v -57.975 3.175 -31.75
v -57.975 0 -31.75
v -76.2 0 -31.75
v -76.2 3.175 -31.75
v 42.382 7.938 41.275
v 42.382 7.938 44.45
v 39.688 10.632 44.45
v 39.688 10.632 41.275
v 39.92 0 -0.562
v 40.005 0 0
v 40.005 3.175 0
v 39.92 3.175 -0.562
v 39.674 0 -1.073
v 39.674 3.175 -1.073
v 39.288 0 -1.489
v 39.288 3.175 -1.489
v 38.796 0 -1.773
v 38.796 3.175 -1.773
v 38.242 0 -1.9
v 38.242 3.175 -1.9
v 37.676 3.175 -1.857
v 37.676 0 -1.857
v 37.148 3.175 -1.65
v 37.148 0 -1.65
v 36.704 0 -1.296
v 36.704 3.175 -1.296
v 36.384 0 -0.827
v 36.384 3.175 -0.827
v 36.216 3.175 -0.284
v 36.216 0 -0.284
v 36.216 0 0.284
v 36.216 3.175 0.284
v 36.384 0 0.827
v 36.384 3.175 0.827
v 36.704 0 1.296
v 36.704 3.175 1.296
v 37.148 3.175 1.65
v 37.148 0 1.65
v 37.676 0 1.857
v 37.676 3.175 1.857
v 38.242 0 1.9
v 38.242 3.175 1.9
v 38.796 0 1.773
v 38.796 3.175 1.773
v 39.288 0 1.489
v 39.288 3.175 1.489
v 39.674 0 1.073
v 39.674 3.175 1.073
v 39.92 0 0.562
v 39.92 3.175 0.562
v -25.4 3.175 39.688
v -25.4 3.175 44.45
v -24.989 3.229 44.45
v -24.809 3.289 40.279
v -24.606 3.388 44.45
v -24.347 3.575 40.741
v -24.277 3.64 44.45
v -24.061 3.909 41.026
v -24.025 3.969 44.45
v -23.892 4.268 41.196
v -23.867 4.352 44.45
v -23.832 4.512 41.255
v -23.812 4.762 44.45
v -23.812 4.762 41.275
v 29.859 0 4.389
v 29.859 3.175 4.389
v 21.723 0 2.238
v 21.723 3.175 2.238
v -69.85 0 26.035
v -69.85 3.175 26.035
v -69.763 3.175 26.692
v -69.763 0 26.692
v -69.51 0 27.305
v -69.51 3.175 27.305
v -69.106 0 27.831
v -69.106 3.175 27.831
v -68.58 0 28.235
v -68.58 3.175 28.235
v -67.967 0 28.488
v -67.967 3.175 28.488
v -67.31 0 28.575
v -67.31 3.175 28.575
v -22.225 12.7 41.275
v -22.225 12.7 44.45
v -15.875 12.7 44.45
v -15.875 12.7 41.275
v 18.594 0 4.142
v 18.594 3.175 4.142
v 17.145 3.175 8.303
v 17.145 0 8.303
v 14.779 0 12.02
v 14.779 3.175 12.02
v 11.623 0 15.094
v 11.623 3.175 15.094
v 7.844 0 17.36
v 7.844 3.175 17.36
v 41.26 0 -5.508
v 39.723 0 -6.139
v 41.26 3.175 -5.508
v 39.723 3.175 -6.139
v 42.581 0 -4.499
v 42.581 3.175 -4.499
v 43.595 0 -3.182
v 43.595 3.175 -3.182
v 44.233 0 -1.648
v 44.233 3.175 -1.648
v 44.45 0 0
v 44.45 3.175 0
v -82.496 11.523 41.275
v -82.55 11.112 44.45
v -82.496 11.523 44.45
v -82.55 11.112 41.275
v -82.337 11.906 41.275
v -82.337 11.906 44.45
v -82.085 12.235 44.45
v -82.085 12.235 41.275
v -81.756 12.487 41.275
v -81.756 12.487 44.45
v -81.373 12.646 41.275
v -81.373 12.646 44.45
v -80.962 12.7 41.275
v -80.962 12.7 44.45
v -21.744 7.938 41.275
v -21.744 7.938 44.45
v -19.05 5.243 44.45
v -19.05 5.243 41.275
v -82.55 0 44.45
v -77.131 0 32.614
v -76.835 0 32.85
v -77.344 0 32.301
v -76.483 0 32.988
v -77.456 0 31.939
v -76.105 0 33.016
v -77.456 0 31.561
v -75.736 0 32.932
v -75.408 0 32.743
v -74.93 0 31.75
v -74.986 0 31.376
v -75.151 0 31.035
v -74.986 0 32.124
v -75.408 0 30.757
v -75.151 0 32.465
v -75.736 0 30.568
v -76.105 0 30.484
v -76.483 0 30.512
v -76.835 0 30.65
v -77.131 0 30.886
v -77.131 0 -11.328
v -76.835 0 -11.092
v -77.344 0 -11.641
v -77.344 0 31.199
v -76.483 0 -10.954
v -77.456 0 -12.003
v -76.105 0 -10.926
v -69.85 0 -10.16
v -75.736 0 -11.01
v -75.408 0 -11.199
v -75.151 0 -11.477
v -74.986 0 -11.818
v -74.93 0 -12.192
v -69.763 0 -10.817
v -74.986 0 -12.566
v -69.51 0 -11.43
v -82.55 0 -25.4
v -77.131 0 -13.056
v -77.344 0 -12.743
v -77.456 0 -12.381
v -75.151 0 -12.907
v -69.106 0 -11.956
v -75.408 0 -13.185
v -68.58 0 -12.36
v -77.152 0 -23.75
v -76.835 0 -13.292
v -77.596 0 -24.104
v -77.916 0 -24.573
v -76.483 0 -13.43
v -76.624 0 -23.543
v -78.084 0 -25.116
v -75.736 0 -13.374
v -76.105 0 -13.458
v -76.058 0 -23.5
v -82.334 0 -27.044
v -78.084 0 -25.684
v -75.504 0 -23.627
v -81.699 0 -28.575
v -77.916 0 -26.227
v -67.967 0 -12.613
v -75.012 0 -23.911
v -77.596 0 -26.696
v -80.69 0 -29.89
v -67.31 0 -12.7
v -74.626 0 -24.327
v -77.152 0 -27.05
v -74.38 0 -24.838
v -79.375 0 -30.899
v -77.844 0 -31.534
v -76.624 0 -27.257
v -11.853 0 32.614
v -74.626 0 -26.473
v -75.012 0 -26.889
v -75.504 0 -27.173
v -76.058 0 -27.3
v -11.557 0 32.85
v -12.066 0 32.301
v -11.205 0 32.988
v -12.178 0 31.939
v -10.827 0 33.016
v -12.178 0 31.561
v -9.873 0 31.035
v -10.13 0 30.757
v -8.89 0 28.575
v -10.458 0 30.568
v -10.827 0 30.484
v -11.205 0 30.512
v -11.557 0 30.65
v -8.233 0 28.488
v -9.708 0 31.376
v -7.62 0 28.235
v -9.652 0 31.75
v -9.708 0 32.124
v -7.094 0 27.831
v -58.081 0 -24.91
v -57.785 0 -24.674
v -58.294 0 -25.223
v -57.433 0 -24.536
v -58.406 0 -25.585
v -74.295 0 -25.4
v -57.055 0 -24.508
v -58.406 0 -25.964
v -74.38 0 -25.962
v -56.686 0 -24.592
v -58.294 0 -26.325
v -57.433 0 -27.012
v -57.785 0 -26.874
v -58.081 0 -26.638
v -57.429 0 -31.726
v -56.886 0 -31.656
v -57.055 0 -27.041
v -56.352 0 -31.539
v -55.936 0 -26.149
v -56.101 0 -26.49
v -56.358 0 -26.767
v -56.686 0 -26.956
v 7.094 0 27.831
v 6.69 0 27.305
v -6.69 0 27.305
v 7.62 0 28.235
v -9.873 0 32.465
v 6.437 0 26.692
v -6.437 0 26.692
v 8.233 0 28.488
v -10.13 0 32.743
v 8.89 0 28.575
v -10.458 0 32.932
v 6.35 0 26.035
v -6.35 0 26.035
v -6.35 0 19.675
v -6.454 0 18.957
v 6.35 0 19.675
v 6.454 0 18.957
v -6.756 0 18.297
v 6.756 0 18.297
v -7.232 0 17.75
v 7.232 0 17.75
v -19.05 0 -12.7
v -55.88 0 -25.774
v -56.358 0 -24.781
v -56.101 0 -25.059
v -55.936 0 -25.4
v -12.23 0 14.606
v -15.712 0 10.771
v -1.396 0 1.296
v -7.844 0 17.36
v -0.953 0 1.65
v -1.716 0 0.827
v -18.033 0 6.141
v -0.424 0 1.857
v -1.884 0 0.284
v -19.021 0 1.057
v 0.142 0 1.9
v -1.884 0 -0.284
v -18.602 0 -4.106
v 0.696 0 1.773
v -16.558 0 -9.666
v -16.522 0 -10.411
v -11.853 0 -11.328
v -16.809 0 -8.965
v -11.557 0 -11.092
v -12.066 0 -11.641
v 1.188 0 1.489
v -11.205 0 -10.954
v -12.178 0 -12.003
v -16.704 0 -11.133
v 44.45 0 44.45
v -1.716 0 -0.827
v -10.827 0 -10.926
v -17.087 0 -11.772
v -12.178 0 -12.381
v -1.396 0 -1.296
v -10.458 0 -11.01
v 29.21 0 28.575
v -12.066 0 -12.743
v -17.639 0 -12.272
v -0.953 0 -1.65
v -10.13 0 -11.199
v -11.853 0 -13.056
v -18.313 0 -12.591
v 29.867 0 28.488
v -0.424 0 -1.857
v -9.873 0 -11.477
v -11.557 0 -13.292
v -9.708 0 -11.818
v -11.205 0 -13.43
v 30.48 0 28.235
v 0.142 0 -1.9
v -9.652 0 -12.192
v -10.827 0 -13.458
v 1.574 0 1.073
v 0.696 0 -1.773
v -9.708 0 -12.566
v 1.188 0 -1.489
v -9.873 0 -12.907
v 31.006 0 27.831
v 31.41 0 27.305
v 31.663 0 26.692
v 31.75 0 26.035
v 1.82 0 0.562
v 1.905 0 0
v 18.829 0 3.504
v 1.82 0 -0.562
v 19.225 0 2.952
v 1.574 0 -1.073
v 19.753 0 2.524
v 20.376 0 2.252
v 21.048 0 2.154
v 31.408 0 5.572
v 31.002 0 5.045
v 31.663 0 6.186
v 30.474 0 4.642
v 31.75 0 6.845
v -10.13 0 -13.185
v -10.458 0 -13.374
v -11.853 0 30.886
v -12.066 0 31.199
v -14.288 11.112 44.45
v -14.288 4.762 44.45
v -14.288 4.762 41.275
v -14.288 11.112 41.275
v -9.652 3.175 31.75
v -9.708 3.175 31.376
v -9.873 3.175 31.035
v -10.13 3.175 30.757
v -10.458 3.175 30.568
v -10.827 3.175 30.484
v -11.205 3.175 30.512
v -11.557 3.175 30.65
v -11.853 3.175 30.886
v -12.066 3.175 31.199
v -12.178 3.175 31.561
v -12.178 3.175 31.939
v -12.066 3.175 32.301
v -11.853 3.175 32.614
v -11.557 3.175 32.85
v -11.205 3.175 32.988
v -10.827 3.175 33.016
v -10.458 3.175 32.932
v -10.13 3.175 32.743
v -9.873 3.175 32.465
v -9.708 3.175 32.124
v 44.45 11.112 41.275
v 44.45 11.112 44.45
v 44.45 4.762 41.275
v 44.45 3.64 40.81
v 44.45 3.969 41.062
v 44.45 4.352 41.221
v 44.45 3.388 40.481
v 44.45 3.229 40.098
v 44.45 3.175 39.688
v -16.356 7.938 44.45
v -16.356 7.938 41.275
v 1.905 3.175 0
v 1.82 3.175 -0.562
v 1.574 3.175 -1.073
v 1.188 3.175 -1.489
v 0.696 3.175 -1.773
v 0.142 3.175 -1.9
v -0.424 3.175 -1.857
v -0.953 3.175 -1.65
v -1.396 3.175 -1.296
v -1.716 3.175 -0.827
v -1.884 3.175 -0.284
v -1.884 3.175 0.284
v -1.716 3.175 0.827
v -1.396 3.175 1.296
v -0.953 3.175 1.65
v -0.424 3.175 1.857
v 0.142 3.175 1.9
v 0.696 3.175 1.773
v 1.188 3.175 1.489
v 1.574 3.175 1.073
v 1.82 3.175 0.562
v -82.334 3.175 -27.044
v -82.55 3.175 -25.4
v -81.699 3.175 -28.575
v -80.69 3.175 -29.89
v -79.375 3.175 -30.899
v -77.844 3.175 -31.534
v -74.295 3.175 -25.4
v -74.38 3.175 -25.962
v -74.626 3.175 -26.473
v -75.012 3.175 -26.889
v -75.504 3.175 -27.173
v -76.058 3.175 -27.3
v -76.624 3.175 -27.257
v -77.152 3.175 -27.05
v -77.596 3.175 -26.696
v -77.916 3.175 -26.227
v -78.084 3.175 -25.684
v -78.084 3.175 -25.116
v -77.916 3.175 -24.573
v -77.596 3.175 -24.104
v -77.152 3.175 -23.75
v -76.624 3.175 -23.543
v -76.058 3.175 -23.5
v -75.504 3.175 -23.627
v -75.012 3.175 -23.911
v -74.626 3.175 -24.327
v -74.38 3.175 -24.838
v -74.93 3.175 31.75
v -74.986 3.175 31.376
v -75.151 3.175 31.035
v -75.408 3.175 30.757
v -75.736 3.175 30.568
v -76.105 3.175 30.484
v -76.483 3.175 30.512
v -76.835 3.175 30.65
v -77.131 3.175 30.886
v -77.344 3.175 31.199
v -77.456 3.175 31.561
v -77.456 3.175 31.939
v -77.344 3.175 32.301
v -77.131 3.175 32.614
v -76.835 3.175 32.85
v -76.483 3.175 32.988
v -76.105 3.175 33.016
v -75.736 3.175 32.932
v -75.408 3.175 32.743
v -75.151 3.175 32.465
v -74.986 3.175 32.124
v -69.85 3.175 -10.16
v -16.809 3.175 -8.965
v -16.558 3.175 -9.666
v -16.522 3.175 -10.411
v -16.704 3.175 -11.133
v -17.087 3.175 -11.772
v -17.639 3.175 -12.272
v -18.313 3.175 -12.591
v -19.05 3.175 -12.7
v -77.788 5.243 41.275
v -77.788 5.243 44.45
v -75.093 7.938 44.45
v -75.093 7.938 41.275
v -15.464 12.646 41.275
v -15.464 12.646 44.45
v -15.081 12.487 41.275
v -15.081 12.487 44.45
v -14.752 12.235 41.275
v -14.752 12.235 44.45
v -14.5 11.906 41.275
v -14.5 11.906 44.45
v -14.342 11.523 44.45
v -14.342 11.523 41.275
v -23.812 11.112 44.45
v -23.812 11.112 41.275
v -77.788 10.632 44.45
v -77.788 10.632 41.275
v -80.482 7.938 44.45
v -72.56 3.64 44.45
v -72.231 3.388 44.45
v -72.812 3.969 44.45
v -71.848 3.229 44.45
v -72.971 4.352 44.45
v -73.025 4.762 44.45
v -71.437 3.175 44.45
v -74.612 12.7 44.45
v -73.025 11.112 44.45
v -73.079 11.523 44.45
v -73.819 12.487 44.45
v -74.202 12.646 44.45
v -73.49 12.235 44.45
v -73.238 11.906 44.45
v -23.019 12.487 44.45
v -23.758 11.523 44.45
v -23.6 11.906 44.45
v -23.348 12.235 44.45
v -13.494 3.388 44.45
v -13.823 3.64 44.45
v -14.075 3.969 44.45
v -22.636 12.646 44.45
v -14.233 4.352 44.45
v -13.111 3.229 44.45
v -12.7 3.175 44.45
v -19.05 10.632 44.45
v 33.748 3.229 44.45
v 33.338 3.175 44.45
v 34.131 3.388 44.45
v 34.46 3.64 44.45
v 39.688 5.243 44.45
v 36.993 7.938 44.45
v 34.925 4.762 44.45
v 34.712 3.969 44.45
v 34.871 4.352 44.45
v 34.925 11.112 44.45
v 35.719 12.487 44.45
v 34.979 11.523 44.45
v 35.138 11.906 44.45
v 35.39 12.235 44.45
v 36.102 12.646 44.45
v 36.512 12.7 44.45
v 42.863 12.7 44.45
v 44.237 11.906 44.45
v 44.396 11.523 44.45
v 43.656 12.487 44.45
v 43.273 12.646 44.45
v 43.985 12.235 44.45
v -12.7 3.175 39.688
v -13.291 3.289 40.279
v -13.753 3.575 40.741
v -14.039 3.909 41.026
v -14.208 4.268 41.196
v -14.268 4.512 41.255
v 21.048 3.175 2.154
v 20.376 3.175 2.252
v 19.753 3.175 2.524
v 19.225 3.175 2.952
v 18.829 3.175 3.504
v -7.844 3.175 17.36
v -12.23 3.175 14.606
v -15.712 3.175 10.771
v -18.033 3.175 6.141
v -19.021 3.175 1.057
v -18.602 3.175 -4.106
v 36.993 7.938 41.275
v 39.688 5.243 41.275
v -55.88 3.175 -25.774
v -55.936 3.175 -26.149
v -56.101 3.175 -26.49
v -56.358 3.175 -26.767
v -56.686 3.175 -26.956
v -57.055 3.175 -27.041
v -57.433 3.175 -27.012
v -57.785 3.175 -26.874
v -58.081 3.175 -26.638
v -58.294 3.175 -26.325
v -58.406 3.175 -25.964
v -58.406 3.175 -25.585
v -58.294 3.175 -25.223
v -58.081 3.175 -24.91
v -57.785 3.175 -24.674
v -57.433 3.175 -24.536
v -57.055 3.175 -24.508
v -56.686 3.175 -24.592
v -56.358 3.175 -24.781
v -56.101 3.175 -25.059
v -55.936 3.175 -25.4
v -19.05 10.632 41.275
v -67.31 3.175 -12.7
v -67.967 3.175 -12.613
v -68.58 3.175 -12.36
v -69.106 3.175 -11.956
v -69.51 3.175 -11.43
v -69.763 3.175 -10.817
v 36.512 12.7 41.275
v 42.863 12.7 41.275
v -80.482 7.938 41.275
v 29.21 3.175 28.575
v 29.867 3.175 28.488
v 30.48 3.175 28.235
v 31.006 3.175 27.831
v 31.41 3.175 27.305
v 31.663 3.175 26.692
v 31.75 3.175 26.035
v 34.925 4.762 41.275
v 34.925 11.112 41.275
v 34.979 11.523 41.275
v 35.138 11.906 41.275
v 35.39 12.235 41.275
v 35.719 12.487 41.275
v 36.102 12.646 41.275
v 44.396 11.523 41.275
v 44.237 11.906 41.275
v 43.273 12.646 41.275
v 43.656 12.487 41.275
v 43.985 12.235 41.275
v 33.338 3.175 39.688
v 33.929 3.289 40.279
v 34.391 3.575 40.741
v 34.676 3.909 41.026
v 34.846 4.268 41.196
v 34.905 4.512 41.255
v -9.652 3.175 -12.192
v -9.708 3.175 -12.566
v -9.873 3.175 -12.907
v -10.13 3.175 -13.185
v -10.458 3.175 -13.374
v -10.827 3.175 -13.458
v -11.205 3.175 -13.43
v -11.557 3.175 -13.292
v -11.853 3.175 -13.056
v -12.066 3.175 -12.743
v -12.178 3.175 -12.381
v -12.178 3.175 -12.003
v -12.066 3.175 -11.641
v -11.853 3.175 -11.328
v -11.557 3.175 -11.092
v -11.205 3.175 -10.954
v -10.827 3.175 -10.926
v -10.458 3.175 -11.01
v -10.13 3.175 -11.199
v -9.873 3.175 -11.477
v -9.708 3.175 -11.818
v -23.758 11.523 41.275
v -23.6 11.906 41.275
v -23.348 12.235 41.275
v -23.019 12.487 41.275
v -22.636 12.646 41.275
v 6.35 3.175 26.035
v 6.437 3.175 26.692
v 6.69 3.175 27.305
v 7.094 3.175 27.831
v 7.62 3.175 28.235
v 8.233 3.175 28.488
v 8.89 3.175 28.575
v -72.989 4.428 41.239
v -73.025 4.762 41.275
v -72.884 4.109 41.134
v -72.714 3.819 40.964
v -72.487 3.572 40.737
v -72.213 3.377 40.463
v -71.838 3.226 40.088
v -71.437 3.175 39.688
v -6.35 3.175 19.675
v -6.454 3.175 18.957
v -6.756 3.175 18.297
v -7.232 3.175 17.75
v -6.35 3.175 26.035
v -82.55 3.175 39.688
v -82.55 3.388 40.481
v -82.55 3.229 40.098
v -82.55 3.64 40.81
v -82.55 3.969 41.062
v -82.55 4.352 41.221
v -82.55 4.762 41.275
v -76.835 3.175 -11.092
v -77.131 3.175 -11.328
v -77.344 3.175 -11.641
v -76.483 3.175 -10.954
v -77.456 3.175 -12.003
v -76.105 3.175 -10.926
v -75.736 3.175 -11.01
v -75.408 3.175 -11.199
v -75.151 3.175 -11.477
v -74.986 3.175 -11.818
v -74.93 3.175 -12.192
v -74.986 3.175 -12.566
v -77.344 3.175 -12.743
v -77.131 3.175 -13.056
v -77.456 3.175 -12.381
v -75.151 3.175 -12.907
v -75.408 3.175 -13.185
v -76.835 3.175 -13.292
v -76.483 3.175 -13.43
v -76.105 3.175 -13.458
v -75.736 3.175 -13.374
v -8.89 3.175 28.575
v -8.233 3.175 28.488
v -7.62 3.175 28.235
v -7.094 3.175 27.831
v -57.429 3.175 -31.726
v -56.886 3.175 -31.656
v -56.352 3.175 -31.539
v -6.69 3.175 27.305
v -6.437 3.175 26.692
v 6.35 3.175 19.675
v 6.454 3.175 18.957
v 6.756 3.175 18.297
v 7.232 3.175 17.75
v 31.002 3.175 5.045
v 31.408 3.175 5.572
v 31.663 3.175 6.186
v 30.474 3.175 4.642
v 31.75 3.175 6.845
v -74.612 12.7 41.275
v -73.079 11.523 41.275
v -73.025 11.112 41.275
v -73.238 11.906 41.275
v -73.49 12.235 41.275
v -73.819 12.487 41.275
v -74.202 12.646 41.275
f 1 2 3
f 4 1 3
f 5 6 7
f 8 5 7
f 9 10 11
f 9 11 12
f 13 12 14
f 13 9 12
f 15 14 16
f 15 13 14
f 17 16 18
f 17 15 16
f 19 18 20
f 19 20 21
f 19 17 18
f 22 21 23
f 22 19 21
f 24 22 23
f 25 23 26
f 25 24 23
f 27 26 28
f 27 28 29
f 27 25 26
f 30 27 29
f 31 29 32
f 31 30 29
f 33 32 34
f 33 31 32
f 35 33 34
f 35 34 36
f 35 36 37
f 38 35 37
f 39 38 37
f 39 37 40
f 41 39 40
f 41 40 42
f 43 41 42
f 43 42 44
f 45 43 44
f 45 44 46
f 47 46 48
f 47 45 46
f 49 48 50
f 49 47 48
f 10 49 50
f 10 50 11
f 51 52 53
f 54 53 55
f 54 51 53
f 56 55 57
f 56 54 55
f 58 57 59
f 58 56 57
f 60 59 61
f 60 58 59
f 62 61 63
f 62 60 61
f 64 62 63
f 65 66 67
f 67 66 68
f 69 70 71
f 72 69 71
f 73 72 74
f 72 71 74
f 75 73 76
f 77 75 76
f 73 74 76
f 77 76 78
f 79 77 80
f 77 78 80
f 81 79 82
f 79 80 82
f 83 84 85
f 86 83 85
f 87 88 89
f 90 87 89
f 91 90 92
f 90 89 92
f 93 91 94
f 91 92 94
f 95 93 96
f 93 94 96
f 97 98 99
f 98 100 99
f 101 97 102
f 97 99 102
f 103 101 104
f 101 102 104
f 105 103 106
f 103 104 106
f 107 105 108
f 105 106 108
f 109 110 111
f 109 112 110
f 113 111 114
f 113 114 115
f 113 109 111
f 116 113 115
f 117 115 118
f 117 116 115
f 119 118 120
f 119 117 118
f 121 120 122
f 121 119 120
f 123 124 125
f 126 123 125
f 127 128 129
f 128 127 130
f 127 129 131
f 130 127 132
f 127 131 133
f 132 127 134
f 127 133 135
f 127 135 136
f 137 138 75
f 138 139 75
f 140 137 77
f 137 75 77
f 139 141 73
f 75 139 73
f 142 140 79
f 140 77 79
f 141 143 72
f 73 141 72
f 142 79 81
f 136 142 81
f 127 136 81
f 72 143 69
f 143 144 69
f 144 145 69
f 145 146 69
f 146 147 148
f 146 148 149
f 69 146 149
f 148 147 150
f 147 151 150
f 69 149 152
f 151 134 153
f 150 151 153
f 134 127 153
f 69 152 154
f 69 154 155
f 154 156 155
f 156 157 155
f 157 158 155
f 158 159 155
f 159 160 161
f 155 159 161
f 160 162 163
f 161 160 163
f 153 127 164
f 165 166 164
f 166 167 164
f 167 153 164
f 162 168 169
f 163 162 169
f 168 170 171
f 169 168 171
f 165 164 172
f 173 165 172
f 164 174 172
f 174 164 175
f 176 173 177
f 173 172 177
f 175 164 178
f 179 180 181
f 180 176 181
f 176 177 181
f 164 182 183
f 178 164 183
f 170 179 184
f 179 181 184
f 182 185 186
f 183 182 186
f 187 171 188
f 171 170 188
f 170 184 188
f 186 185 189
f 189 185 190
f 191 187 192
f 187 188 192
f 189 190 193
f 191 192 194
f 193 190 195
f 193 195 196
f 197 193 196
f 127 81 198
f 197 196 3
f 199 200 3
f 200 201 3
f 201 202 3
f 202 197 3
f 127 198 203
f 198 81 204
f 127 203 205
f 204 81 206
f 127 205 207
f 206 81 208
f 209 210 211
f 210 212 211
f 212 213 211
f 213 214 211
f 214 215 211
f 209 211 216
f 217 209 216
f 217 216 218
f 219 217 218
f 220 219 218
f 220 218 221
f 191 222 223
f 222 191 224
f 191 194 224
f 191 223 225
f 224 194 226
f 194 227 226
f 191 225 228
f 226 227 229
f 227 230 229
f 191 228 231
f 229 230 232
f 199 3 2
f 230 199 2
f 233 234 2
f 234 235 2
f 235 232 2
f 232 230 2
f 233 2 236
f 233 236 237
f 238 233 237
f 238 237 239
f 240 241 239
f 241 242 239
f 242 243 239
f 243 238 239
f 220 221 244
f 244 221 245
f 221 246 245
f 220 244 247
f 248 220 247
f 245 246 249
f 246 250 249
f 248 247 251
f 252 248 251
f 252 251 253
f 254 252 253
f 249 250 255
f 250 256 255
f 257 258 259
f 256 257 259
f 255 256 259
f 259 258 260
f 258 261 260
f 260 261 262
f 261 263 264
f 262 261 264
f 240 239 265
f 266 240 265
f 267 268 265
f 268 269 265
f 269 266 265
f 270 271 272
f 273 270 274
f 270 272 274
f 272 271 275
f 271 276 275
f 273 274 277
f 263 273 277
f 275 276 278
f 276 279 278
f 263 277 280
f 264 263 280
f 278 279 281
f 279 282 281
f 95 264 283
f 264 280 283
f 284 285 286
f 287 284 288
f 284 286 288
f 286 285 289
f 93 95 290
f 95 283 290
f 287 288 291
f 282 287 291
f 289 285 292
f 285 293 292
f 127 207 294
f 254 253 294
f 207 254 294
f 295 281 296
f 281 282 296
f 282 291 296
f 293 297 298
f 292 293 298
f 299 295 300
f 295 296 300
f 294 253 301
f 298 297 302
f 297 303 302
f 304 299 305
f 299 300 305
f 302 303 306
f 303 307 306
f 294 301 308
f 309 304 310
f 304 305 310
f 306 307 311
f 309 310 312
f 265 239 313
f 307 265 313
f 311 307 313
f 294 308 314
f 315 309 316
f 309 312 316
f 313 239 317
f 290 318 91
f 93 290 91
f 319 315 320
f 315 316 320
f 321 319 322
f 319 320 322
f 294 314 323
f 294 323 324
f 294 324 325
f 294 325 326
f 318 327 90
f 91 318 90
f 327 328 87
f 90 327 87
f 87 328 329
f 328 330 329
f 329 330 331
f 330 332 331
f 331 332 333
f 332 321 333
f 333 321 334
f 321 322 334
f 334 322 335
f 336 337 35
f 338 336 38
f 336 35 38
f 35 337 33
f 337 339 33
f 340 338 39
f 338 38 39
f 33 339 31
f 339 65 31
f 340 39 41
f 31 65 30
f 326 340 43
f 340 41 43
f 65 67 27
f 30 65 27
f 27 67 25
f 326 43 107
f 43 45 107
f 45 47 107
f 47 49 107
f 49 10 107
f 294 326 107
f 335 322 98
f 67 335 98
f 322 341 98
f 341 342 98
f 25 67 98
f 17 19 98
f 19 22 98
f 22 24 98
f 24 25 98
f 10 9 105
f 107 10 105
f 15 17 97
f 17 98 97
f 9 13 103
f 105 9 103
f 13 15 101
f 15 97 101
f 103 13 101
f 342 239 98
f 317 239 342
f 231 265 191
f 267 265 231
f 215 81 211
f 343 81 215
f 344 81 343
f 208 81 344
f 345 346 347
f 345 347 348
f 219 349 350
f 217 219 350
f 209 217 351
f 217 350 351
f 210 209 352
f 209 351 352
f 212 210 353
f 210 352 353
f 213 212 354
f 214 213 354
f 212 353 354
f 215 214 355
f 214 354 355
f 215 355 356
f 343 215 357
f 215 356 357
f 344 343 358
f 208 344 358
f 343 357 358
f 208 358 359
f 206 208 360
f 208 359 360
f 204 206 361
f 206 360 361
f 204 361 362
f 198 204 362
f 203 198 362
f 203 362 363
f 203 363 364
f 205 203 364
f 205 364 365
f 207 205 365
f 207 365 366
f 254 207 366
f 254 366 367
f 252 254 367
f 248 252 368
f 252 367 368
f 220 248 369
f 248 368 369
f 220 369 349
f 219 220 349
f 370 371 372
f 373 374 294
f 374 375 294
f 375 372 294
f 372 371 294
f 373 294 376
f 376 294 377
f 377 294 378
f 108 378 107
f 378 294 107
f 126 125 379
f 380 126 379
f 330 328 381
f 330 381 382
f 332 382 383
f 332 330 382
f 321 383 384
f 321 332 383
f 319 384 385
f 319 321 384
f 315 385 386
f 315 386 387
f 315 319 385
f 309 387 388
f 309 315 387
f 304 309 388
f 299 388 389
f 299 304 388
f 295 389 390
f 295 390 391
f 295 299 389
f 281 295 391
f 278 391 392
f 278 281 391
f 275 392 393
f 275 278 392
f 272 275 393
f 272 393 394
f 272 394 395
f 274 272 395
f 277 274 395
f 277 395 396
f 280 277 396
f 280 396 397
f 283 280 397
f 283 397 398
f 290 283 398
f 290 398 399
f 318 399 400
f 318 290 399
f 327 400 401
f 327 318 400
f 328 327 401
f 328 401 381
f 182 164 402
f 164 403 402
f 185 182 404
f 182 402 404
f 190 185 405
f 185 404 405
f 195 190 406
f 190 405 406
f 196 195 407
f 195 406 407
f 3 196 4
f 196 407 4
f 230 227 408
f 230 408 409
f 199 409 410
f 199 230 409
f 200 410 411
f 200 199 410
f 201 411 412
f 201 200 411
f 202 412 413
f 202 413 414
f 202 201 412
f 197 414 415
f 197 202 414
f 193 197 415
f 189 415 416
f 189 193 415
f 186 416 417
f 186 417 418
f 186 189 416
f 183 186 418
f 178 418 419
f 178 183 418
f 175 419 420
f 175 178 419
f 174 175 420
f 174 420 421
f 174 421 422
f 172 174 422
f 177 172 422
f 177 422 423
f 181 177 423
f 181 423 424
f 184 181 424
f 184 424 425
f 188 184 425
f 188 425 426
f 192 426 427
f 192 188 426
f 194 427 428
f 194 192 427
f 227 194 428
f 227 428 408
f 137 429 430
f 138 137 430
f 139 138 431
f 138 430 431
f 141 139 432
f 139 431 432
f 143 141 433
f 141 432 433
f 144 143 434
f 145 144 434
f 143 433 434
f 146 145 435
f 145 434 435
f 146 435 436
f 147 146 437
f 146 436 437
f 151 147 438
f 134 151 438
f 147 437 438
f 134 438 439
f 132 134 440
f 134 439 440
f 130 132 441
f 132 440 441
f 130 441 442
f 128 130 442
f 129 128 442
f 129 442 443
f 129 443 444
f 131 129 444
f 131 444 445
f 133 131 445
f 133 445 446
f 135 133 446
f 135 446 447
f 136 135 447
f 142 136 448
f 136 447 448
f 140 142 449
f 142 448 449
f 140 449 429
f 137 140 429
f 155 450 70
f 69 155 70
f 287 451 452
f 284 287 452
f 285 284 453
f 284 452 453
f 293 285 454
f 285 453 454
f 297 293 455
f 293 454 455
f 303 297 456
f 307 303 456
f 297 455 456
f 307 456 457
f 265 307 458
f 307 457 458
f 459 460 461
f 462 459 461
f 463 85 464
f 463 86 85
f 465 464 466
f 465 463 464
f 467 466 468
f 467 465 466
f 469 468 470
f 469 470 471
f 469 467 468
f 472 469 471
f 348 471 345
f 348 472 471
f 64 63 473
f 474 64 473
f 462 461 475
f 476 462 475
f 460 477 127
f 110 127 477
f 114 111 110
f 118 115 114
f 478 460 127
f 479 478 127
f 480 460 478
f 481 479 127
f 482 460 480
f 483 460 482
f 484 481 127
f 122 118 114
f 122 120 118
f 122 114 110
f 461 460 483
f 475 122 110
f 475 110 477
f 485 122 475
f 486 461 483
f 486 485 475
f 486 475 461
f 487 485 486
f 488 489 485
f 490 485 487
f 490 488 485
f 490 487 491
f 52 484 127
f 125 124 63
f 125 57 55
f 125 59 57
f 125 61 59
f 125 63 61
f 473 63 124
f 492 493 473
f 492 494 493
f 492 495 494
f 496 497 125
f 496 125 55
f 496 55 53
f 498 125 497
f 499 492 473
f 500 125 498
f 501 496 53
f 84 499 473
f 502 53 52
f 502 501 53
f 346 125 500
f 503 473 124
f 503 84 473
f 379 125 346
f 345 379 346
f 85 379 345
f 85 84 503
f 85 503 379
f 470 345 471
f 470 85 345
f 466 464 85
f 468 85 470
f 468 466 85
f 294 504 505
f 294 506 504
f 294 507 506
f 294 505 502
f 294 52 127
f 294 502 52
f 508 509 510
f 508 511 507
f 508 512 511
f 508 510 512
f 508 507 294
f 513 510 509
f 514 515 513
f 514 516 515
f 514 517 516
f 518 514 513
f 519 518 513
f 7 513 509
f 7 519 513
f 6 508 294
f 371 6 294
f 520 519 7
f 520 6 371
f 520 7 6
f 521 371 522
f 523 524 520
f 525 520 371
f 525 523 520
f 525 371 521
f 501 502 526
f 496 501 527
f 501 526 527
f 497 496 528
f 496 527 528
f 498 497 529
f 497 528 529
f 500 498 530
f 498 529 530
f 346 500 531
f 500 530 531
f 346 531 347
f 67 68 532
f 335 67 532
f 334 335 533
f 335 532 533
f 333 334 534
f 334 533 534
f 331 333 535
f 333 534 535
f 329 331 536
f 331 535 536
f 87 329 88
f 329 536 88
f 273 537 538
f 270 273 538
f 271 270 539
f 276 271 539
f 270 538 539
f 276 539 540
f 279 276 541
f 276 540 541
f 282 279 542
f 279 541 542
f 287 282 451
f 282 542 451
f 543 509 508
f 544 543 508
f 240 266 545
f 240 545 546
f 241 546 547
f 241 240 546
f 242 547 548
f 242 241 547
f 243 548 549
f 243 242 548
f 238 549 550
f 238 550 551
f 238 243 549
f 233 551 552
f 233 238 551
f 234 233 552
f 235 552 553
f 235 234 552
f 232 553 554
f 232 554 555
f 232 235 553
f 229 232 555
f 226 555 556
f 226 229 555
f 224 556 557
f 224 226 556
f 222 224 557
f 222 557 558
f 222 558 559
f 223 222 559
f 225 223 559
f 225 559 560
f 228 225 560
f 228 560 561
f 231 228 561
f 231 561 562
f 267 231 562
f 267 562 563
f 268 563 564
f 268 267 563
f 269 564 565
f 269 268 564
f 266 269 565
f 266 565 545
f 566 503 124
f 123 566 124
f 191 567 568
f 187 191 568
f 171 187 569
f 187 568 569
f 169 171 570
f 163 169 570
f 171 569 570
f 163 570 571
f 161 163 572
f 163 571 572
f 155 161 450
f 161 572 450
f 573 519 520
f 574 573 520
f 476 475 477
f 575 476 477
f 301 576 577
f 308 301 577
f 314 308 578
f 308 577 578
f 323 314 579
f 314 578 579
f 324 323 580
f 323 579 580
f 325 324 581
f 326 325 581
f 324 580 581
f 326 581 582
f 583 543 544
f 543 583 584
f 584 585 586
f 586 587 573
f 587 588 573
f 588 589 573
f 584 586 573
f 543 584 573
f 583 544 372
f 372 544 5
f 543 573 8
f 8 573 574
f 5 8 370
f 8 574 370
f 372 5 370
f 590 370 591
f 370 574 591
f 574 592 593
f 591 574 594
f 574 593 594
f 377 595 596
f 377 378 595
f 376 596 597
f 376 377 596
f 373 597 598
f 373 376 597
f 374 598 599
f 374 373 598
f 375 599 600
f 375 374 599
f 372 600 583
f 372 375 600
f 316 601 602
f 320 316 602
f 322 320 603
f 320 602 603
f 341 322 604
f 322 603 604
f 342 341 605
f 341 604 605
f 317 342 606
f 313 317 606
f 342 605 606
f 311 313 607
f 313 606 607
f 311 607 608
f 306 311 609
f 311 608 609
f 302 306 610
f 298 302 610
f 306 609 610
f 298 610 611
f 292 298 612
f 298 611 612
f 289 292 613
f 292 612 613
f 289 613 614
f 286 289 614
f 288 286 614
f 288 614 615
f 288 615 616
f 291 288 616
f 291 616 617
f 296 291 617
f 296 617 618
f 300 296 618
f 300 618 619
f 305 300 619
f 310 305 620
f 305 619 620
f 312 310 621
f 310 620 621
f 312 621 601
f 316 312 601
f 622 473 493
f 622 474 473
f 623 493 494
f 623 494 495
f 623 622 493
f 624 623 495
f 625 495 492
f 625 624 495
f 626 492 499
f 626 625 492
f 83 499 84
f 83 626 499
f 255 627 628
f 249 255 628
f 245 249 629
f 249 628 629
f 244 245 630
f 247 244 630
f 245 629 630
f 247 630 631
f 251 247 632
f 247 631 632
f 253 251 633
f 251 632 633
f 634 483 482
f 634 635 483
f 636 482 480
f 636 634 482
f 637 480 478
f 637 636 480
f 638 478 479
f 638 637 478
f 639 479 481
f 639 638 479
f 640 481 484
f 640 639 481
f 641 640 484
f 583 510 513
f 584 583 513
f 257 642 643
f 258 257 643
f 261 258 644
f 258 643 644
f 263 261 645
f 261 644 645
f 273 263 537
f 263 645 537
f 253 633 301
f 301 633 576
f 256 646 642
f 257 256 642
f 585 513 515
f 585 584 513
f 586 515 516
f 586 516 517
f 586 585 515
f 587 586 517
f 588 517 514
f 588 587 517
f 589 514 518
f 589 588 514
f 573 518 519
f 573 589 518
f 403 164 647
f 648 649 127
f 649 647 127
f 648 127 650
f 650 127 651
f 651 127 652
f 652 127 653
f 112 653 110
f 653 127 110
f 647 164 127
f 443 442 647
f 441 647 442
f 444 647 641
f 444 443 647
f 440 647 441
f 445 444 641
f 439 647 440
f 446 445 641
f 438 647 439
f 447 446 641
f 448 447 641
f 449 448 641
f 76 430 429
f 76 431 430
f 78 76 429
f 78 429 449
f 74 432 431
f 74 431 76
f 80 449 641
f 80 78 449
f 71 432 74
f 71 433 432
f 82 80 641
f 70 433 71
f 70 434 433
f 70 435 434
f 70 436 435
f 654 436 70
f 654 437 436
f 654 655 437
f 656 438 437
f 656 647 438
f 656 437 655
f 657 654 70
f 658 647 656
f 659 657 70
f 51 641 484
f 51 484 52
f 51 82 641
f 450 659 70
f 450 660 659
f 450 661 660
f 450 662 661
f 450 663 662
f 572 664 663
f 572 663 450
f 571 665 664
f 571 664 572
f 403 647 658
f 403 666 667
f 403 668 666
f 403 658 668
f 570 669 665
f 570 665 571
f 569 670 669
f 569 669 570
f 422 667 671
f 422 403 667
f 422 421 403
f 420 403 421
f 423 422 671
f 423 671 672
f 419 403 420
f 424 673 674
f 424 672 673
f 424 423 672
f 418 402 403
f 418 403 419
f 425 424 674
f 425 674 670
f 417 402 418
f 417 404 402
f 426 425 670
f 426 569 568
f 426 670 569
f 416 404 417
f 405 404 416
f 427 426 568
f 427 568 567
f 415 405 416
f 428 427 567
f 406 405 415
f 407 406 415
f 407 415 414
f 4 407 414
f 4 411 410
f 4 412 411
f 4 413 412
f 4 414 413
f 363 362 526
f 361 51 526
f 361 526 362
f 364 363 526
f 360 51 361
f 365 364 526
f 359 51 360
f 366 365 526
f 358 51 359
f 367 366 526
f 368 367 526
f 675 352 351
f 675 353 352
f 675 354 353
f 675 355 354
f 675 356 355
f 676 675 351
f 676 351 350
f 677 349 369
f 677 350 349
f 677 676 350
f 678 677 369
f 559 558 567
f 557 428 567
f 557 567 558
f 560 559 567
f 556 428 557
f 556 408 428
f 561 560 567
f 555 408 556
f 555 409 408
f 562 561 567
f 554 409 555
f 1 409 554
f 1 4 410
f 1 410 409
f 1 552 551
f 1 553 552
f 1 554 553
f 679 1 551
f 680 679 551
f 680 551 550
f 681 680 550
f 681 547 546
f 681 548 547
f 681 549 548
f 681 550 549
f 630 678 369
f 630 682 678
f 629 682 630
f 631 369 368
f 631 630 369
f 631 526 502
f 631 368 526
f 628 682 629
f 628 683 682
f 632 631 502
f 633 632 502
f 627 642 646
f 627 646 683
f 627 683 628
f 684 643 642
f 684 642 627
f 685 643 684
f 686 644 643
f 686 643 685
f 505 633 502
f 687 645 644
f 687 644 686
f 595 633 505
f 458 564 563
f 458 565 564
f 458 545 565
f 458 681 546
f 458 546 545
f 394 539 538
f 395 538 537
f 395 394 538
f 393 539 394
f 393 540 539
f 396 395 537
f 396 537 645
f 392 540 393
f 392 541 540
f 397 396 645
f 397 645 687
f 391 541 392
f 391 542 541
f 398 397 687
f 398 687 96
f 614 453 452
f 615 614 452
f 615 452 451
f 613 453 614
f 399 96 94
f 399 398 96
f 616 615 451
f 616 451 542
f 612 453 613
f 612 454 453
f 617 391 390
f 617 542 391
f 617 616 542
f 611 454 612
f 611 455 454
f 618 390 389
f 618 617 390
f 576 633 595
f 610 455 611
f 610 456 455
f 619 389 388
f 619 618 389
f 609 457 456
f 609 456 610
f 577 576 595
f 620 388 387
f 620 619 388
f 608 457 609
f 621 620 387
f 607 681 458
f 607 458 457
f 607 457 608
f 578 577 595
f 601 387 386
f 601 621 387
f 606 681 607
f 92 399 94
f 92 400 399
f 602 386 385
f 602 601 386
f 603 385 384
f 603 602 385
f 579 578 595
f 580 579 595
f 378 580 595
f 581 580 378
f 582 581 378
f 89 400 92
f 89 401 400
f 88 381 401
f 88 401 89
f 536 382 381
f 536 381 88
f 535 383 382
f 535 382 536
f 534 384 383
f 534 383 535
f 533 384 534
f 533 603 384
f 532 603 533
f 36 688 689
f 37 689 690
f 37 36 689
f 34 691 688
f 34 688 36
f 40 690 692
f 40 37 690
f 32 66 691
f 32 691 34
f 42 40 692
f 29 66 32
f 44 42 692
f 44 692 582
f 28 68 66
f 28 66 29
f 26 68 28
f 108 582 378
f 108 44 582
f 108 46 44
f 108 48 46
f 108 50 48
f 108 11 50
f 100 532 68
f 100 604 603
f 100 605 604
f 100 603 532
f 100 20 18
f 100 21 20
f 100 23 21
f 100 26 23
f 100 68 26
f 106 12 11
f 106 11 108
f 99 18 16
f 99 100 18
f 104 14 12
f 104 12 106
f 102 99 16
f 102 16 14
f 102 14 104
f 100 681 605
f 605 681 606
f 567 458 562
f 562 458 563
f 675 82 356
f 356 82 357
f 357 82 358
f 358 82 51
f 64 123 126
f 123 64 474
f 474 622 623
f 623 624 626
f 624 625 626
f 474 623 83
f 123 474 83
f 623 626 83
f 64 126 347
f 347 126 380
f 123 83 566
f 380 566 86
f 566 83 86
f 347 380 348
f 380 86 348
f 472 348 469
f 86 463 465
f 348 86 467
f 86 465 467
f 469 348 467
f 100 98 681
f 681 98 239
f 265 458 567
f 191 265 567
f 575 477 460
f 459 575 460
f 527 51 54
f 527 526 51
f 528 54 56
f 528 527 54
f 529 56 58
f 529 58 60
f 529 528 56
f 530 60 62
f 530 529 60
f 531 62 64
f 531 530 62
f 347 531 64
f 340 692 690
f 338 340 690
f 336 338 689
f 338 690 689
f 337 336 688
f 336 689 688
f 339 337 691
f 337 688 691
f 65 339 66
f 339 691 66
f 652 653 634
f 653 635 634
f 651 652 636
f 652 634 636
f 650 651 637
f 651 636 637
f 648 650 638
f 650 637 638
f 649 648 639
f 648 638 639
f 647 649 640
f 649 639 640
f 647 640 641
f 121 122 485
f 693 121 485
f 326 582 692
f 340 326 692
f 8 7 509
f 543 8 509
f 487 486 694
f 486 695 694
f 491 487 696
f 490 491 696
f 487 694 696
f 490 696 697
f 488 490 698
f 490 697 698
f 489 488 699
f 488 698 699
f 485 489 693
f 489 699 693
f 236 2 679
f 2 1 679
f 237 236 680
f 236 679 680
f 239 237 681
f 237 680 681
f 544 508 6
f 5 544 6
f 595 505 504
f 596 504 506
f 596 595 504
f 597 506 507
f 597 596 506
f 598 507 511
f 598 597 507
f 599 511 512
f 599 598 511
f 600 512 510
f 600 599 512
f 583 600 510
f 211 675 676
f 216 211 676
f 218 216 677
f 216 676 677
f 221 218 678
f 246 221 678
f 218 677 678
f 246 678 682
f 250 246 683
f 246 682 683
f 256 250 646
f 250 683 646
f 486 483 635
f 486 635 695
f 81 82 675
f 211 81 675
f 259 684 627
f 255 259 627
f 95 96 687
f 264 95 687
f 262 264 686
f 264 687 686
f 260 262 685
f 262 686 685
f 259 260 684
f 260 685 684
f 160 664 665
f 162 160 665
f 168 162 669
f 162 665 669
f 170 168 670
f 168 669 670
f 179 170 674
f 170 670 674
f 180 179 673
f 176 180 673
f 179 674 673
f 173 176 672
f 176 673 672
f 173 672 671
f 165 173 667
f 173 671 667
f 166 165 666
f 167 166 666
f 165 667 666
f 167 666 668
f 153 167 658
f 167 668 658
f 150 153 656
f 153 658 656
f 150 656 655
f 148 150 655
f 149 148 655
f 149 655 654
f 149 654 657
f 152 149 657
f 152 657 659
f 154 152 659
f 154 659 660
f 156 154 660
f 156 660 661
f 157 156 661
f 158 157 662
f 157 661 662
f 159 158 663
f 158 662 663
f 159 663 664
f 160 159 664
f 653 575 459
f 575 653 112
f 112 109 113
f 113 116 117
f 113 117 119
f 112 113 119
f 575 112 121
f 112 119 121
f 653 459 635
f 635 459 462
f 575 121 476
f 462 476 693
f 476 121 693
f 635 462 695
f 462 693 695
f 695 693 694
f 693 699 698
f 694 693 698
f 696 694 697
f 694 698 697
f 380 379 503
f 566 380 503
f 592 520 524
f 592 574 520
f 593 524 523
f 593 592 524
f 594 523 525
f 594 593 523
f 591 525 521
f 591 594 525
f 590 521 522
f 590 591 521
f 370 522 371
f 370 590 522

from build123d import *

# Parameters (mm, degrees)
SKETCH1_R           = 1.905
SKETCH1_R_2         = 1.27
BOSS_EXTRUDE1_DEPTH = 3.175
SKETCH2_R           = 1.27
CUT_EXTRUDE1_DEPTH  = 3.175
FILLET1_R           = 6.35
SKETCH3_W           = 9.525
SKETCH3_H           = 9.525
BOSS_EXTRUDE2_DEPTH = 3.175
FILLET2_R           = 1.5875


with BuildPart() as part:
    # Sketch1 → Boss-Extrude1 (new body)
    with BuildSketch(Plane(origin=(0, 0, 0), x_dir=(1, 0, 0), z_dir=(0, 1, 0))):
        Polygon((-82.55, 31.75), (-82.55, -44.45), (44.45, -44.45), (44.45, 4.889379277), (-57.15, 31.75), align=None)
        Circle(SKETCH1_R, mode=Mode.SUBTRACT)
        with Locations((-57.15, 25.774227063)):
            Circle(SKETCH1_R_2, mode=Mode.SUBTRACT)
        with Locations((-76.2, 25.4)):
            Circle(SKETCH1_R, mode=Mode.SUBTRACT)
        with Locations((38.1, 0)):
            Circle(SKETCH1_R, mode=Mode.SUBTRACT)
    extrude(amount=BOSS_EXTRUDE1_DEPTH)

    # Sketch2 → Cut-Extrude1 (cut)
    with BuildSketch(Plane(origin=(0, 3.175, 0), x_dir=(1, 0, 0), z_dir=(0, 1, 0))):
        with Locations((-76.2, 12.192)):
            Circle(SKETCH2_R)
        with Locations((-10.922, 12.192)):
            Circle(SKETCH2_R)
        with Locations((-10.922, -31.75)):
            Circle(SKETCH2_R)
        with Locations((-76.2, -31.75)):
            Circle(SKETCH2_R)
        with BuildLine():
            Line((-69.85, 10.16), (-69.85, -26.035))
            ThreePointArc((-69.85, -26.035), (-69.106051224, -27.831051224), (-67.31, -28.575))
            Line((-67.31, -28.575), (-8.89, -28.575))
            ThreePointArc((-8.89, -28.575), (-7.093948776, -27.831051224), (-6.35, -26.035))
            Line((-6.35, -26.035), (-6.35, -19.674755399))
            ThreePointArc((-6.35, -19.674755399), (-6.755973152, -18.297246992), (-7.844117647, -17.360078293))
            ThreePointArc((-7.844117647, -17.360078293), (-18.033037532, -6.14101436), (-16.808823529, 8.964705882))
            ThreePointArc((-16.808823529, 8.964705882), (-16.871967969, 11.466819219), (-19.05, 12.7))
            Line((-19.05, 12.7), (-67.31, 12.7))
            ThreePointArc((-67.31, 12.7), (-69.106051224, 11.956051224), (-69.85, 10.16))
        make_face()
        with BuildLine():
            Line((6.35, -19.674755399), (6.35, -26.035))
            ThreePointArc((6.35, -26.035), (7.093948776, -27.831051224), (8.89, -28.575))
            Line((8.89, -28.575), (29.21, -28.575))
            ThreePointArc((29.21, -28.575), (31.006051224, -27.831051224), (31.75, -26.035))
            Line((31.75, -26.035), (31.75, -6.845130987))
            ThreePointArc((31.75, -6.845130987), (31.222535045, -5.295517264), (29.859210479, -4.38949955))
            Line((29.859210479, -4.38949955), (21.722749497, -2.23841301))
            ThreePointArc((21.722749497, -2.23841301), (19.753320798, -2.524108077), (18.594299133, -4.141803924))
            ThreePointArc((18.594299133, -4.141803924), (14.779315437, -12.019747718), (7.844117647, -17.360078293))
            ThreePointArc((7.844117647, -17.360078293), (6.755973152, -18.297246992), (6.35, -19.674755399))
        make_face()
    extrude(amount=-CUT_EXTRUDE1_DEPTH, mode=Mode.SUBTRACT)

    # Fillet1
    fillet1_edges = [part.edges().sort_by_distance(p)[0] for p in [
        (-57.15, 1.5875, -31.75),
        (44.45, 1.5875, -4.889379277),
        (-82.55, 1.5875, -31.75),
    ]]
    fillet(fillet1_edges, radius=FILLET1_R)

    # Sketch3 → Boss-Extrude2 (add)
    with BuildSketch(Plane.XY.offset(44.45)):
        with Locations((-77.7875, 7.9375)):
            Rectangle(SKETCH3_W, SKETCH3_H)
        Polygon((-77.7875, 5.243423164), (-75.093423164, 7.9375), (-77.7875, 10.631576836), (-80.481576836, 7.9375), align=None, mode=Mode.SUBTRACT)
        with Locations((39.6875, 7.9375)):
            Rectangle(SKETCH3_W, SKETCH3_H)
        Polygon((39.6875, 5.243423164), (42.381576836, 7.9375), (39.6875, 10.631576836), (36.993423164, 7.9375), align=None, mode=Mode.SUBTRACT)
        with Locations((-19.05, 7.9375)):
            Rectangle(SKETCH3_W, SKETCH3_H)
        Polygon((-19.05, 5.243423164), (-16.355923164, 7.9375), (-19.05, 10.631576836), (-21.744076836, 7.9375), align=None, mode=Mode.SUBTRACT)
    extrude(amount=-BOSS_EXTRUDE2_DEPTH)

    # Fillet2
    fillet2_edges = [part.edges().sort_by_distance(p)[0] for p in [
        (-82.55, 12.7, 42.8625),
        (-73.025, 12.7, 42.8625),
        (-77.7875, 3.175, 41.275),
        (-73.025, 3.175, 42.8625),
        (44.45, 12.7, 42.8625),
        (39.6875, 3.175, 41.275),
        (34.925, 3.175, 42.8625),
        (34.925, 12.7, 42.8625),
        (-23.8125, 3.175, 42.8625),
        (-23.8125, 12.7, 42.8625),
        (-14.2875, 12.7, 42.8625),
        (-19.05, 3.175, 41.275),
        (-14.2875, 3.175, 42.8625),
    ]]
    fillet(fillet2_edges, radius=FILLET2_R)


solid = part.part
